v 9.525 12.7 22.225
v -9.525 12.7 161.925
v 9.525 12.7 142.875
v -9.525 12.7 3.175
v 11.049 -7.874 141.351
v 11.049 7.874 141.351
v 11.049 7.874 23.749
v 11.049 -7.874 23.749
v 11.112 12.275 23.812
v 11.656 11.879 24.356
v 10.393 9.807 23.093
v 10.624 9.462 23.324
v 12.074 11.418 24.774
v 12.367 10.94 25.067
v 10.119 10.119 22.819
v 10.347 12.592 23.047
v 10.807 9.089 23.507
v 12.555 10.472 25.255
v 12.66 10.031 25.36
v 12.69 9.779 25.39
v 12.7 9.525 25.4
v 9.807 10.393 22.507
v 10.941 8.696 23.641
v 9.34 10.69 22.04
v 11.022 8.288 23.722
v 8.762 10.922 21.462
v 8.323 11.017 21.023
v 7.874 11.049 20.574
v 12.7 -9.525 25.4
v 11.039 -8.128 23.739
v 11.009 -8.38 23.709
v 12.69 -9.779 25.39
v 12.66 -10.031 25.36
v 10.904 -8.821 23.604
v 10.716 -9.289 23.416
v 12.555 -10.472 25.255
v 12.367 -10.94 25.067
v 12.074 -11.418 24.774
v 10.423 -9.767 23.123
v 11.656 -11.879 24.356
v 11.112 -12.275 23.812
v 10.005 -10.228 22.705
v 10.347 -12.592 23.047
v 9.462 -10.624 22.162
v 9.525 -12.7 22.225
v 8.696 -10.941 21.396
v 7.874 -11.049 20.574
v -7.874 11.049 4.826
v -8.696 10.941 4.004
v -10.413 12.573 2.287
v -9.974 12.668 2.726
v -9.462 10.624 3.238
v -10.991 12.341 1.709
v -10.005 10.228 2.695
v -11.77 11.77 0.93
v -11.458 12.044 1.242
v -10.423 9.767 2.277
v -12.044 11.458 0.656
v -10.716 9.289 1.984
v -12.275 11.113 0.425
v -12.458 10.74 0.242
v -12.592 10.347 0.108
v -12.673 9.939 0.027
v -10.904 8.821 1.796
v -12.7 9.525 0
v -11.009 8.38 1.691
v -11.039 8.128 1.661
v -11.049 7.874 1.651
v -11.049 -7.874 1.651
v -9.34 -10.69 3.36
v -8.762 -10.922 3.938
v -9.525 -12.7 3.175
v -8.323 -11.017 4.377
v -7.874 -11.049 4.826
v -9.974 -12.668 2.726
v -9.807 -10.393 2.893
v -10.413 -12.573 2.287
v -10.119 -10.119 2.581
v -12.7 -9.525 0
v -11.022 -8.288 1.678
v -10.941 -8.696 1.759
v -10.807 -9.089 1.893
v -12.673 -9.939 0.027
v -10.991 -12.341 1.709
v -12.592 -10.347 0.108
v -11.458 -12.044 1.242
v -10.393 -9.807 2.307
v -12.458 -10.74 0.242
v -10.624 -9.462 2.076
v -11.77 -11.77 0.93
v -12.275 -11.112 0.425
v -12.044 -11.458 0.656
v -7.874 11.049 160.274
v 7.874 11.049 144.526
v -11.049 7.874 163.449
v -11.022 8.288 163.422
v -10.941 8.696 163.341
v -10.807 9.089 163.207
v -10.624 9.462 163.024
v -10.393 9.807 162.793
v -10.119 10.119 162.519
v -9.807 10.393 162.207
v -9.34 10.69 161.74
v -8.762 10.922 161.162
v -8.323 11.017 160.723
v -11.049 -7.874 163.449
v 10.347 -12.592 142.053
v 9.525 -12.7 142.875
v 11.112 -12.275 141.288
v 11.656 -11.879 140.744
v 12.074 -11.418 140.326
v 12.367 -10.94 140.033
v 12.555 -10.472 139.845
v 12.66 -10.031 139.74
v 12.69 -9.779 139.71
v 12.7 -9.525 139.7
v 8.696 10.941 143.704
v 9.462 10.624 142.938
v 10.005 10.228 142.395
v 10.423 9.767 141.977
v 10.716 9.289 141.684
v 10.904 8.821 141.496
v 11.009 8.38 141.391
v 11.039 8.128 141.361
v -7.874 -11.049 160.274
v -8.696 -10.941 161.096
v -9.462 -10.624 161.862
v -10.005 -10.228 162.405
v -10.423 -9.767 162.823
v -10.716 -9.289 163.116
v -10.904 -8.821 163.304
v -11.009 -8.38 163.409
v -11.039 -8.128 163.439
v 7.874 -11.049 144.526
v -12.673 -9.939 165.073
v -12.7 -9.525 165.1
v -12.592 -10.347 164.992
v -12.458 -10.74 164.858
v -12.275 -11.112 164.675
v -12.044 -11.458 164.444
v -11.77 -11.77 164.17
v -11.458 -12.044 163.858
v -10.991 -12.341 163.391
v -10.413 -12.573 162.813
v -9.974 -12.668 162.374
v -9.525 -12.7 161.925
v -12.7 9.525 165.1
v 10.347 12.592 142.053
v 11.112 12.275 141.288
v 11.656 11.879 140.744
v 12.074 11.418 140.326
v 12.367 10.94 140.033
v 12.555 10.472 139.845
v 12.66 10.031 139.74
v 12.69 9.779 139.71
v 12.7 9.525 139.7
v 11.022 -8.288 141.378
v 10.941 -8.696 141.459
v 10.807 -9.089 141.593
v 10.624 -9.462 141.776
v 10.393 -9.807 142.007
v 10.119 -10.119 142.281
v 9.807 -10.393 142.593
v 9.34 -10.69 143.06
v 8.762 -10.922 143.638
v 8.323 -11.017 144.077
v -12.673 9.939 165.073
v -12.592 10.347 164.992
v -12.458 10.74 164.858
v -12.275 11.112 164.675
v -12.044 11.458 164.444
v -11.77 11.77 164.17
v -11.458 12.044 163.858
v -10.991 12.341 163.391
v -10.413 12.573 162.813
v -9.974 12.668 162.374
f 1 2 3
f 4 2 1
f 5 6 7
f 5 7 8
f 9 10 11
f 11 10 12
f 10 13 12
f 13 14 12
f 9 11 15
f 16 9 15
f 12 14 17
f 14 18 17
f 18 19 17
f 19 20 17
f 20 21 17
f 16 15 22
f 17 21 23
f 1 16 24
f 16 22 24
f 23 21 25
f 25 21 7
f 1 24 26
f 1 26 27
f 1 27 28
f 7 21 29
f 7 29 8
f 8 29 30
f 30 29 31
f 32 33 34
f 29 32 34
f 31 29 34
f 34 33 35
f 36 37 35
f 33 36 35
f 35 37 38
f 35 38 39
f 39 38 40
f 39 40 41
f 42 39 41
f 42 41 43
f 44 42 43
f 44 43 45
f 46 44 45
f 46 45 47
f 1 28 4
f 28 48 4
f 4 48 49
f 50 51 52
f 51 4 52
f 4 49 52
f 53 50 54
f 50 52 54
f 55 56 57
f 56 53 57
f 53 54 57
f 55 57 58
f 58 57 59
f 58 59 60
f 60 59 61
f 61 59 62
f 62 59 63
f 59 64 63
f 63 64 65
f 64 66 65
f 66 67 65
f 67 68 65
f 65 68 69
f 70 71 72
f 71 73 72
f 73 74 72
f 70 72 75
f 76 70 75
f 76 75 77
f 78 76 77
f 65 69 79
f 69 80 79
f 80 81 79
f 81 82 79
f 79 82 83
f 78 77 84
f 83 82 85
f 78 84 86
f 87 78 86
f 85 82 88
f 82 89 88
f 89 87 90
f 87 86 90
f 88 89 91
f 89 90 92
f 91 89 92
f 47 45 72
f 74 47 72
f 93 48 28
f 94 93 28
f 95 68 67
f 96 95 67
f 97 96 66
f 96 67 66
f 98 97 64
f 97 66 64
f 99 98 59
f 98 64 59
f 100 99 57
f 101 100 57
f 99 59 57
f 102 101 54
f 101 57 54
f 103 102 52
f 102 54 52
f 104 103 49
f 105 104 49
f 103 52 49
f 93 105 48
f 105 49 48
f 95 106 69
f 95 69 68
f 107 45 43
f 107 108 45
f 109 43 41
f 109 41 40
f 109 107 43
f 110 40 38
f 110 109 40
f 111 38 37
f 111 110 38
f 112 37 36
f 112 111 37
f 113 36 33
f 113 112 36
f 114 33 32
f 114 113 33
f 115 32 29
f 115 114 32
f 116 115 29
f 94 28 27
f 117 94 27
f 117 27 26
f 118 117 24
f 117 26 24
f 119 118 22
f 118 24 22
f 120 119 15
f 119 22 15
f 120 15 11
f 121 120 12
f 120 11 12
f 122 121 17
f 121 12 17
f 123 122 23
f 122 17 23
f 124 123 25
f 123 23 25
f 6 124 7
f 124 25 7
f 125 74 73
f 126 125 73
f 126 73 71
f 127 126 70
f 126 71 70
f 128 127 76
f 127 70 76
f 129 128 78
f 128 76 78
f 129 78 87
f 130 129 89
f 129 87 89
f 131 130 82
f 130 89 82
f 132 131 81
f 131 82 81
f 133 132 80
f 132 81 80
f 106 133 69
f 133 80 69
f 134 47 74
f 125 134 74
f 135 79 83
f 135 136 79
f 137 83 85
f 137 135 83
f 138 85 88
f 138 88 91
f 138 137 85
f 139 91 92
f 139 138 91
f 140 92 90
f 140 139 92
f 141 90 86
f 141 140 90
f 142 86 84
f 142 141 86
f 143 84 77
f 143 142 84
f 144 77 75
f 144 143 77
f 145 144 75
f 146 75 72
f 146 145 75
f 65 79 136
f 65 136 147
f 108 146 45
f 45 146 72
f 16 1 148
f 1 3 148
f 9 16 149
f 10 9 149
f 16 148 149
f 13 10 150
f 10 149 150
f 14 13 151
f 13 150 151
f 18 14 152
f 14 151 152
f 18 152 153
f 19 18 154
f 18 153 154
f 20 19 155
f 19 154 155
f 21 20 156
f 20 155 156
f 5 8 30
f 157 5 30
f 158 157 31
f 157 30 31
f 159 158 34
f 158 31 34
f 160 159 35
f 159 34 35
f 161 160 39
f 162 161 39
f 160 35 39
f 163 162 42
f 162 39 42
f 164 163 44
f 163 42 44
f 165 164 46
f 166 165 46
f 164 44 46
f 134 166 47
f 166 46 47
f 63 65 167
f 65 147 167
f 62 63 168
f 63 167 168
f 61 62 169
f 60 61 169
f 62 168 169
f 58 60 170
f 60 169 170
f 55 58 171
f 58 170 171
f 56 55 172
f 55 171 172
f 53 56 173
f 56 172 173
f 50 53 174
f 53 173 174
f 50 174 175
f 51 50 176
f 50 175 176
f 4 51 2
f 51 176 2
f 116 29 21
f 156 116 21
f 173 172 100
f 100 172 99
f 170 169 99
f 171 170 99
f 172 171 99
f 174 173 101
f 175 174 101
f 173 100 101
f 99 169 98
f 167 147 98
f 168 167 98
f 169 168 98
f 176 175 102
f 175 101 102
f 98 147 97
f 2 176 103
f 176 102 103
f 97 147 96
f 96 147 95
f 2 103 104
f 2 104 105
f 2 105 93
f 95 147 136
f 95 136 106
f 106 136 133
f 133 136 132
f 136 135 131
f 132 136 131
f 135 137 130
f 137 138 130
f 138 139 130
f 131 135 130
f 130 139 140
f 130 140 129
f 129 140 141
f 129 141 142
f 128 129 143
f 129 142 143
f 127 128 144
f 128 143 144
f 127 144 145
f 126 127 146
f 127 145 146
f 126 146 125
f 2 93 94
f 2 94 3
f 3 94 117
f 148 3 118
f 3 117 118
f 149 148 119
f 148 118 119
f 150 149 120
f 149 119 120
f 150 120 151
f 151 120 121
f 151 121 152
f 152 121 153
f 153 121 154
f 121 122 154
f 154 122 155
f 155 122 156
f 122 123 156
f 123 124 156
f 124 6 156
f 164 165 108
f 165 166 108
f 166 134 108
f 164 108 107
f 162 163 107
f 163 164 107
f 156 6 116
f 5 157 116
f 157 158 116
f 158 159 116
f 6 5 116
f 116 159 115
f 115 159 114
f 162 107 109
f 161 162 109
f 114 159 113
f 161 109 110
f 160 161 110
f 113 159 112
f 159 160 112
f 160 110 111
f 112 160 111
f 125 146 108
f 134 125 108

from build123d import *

# Parameters (mm, degrees)
F1_W     = 25.4
F1_H     = 25.4
F2_DEPTH = 165.1
F4_DEPTH = 25.4
F5_R     = 3.175


# Not quite as in the source:
# - a variable given as a bare number and used for a length is read in inches; the dataset says mm whatever the document's units were


with BuildPart() as f2:
    # F1 (on Top) → F2 (new body)
    with BuildSketch(Plane.XY):
        Rectangle(F1_W, F1_H)
        with BuildLine():
            ThreePointArc((-11.049, 7.874), (-10.1190640303, 10.1190640303), (-7.874, 11.049))
            Line((-7.874, 11.049), (7.874, 11.049))
            ThreePointArc((7.874, 11.049), (10.1190640303, 10.1190640303), (11.049, 7.874))
            Line((11.049, 7.874), (11.049, -7.874))
            ThreePointArc((11.049, -7.874), (10.1190640303, -10.1190640303), (7.874, -11.049))
            Line((7.874, -11.049), (-7.874, -11.049))
            ThreePointArc((-7.874, -11.049), (-10.1190640303, -10.1190640303), (-11.049, -7.874))
            Line((-11.049, -7.874), (-11.049, 7.874))
        make_face(mode=Mode.SUBTRACT)
    extrude(amount=F2_DEPTH)

    # F3 (on face) → F4 (cut)
    with BuildSketch(Plane.XZ.offset(12.7)):
        Polygon((12.7, 25.4), (-12.7, 0), (12.7, 0), align=None)
        Polygon((12.7, 165.1), (-12.7, 165.1), (12.7, 139.7), align=None)
    extrude(amount=-F4_DEPTH, mode=Mode.SUBTRACT)

    # F5
    f5_edges = [f2.edges().sort_by_distance(p)[0] for p in [
        (-12.7, 12.7, 82.55),
        (12.7, 12.7, 82.55),
        (-12.7, -12.7, 82.55),
        (12.7, -12.7, 82.55),
    ]]
    fillet(f5_edges, radius=F5_R)


solid = f2.part
